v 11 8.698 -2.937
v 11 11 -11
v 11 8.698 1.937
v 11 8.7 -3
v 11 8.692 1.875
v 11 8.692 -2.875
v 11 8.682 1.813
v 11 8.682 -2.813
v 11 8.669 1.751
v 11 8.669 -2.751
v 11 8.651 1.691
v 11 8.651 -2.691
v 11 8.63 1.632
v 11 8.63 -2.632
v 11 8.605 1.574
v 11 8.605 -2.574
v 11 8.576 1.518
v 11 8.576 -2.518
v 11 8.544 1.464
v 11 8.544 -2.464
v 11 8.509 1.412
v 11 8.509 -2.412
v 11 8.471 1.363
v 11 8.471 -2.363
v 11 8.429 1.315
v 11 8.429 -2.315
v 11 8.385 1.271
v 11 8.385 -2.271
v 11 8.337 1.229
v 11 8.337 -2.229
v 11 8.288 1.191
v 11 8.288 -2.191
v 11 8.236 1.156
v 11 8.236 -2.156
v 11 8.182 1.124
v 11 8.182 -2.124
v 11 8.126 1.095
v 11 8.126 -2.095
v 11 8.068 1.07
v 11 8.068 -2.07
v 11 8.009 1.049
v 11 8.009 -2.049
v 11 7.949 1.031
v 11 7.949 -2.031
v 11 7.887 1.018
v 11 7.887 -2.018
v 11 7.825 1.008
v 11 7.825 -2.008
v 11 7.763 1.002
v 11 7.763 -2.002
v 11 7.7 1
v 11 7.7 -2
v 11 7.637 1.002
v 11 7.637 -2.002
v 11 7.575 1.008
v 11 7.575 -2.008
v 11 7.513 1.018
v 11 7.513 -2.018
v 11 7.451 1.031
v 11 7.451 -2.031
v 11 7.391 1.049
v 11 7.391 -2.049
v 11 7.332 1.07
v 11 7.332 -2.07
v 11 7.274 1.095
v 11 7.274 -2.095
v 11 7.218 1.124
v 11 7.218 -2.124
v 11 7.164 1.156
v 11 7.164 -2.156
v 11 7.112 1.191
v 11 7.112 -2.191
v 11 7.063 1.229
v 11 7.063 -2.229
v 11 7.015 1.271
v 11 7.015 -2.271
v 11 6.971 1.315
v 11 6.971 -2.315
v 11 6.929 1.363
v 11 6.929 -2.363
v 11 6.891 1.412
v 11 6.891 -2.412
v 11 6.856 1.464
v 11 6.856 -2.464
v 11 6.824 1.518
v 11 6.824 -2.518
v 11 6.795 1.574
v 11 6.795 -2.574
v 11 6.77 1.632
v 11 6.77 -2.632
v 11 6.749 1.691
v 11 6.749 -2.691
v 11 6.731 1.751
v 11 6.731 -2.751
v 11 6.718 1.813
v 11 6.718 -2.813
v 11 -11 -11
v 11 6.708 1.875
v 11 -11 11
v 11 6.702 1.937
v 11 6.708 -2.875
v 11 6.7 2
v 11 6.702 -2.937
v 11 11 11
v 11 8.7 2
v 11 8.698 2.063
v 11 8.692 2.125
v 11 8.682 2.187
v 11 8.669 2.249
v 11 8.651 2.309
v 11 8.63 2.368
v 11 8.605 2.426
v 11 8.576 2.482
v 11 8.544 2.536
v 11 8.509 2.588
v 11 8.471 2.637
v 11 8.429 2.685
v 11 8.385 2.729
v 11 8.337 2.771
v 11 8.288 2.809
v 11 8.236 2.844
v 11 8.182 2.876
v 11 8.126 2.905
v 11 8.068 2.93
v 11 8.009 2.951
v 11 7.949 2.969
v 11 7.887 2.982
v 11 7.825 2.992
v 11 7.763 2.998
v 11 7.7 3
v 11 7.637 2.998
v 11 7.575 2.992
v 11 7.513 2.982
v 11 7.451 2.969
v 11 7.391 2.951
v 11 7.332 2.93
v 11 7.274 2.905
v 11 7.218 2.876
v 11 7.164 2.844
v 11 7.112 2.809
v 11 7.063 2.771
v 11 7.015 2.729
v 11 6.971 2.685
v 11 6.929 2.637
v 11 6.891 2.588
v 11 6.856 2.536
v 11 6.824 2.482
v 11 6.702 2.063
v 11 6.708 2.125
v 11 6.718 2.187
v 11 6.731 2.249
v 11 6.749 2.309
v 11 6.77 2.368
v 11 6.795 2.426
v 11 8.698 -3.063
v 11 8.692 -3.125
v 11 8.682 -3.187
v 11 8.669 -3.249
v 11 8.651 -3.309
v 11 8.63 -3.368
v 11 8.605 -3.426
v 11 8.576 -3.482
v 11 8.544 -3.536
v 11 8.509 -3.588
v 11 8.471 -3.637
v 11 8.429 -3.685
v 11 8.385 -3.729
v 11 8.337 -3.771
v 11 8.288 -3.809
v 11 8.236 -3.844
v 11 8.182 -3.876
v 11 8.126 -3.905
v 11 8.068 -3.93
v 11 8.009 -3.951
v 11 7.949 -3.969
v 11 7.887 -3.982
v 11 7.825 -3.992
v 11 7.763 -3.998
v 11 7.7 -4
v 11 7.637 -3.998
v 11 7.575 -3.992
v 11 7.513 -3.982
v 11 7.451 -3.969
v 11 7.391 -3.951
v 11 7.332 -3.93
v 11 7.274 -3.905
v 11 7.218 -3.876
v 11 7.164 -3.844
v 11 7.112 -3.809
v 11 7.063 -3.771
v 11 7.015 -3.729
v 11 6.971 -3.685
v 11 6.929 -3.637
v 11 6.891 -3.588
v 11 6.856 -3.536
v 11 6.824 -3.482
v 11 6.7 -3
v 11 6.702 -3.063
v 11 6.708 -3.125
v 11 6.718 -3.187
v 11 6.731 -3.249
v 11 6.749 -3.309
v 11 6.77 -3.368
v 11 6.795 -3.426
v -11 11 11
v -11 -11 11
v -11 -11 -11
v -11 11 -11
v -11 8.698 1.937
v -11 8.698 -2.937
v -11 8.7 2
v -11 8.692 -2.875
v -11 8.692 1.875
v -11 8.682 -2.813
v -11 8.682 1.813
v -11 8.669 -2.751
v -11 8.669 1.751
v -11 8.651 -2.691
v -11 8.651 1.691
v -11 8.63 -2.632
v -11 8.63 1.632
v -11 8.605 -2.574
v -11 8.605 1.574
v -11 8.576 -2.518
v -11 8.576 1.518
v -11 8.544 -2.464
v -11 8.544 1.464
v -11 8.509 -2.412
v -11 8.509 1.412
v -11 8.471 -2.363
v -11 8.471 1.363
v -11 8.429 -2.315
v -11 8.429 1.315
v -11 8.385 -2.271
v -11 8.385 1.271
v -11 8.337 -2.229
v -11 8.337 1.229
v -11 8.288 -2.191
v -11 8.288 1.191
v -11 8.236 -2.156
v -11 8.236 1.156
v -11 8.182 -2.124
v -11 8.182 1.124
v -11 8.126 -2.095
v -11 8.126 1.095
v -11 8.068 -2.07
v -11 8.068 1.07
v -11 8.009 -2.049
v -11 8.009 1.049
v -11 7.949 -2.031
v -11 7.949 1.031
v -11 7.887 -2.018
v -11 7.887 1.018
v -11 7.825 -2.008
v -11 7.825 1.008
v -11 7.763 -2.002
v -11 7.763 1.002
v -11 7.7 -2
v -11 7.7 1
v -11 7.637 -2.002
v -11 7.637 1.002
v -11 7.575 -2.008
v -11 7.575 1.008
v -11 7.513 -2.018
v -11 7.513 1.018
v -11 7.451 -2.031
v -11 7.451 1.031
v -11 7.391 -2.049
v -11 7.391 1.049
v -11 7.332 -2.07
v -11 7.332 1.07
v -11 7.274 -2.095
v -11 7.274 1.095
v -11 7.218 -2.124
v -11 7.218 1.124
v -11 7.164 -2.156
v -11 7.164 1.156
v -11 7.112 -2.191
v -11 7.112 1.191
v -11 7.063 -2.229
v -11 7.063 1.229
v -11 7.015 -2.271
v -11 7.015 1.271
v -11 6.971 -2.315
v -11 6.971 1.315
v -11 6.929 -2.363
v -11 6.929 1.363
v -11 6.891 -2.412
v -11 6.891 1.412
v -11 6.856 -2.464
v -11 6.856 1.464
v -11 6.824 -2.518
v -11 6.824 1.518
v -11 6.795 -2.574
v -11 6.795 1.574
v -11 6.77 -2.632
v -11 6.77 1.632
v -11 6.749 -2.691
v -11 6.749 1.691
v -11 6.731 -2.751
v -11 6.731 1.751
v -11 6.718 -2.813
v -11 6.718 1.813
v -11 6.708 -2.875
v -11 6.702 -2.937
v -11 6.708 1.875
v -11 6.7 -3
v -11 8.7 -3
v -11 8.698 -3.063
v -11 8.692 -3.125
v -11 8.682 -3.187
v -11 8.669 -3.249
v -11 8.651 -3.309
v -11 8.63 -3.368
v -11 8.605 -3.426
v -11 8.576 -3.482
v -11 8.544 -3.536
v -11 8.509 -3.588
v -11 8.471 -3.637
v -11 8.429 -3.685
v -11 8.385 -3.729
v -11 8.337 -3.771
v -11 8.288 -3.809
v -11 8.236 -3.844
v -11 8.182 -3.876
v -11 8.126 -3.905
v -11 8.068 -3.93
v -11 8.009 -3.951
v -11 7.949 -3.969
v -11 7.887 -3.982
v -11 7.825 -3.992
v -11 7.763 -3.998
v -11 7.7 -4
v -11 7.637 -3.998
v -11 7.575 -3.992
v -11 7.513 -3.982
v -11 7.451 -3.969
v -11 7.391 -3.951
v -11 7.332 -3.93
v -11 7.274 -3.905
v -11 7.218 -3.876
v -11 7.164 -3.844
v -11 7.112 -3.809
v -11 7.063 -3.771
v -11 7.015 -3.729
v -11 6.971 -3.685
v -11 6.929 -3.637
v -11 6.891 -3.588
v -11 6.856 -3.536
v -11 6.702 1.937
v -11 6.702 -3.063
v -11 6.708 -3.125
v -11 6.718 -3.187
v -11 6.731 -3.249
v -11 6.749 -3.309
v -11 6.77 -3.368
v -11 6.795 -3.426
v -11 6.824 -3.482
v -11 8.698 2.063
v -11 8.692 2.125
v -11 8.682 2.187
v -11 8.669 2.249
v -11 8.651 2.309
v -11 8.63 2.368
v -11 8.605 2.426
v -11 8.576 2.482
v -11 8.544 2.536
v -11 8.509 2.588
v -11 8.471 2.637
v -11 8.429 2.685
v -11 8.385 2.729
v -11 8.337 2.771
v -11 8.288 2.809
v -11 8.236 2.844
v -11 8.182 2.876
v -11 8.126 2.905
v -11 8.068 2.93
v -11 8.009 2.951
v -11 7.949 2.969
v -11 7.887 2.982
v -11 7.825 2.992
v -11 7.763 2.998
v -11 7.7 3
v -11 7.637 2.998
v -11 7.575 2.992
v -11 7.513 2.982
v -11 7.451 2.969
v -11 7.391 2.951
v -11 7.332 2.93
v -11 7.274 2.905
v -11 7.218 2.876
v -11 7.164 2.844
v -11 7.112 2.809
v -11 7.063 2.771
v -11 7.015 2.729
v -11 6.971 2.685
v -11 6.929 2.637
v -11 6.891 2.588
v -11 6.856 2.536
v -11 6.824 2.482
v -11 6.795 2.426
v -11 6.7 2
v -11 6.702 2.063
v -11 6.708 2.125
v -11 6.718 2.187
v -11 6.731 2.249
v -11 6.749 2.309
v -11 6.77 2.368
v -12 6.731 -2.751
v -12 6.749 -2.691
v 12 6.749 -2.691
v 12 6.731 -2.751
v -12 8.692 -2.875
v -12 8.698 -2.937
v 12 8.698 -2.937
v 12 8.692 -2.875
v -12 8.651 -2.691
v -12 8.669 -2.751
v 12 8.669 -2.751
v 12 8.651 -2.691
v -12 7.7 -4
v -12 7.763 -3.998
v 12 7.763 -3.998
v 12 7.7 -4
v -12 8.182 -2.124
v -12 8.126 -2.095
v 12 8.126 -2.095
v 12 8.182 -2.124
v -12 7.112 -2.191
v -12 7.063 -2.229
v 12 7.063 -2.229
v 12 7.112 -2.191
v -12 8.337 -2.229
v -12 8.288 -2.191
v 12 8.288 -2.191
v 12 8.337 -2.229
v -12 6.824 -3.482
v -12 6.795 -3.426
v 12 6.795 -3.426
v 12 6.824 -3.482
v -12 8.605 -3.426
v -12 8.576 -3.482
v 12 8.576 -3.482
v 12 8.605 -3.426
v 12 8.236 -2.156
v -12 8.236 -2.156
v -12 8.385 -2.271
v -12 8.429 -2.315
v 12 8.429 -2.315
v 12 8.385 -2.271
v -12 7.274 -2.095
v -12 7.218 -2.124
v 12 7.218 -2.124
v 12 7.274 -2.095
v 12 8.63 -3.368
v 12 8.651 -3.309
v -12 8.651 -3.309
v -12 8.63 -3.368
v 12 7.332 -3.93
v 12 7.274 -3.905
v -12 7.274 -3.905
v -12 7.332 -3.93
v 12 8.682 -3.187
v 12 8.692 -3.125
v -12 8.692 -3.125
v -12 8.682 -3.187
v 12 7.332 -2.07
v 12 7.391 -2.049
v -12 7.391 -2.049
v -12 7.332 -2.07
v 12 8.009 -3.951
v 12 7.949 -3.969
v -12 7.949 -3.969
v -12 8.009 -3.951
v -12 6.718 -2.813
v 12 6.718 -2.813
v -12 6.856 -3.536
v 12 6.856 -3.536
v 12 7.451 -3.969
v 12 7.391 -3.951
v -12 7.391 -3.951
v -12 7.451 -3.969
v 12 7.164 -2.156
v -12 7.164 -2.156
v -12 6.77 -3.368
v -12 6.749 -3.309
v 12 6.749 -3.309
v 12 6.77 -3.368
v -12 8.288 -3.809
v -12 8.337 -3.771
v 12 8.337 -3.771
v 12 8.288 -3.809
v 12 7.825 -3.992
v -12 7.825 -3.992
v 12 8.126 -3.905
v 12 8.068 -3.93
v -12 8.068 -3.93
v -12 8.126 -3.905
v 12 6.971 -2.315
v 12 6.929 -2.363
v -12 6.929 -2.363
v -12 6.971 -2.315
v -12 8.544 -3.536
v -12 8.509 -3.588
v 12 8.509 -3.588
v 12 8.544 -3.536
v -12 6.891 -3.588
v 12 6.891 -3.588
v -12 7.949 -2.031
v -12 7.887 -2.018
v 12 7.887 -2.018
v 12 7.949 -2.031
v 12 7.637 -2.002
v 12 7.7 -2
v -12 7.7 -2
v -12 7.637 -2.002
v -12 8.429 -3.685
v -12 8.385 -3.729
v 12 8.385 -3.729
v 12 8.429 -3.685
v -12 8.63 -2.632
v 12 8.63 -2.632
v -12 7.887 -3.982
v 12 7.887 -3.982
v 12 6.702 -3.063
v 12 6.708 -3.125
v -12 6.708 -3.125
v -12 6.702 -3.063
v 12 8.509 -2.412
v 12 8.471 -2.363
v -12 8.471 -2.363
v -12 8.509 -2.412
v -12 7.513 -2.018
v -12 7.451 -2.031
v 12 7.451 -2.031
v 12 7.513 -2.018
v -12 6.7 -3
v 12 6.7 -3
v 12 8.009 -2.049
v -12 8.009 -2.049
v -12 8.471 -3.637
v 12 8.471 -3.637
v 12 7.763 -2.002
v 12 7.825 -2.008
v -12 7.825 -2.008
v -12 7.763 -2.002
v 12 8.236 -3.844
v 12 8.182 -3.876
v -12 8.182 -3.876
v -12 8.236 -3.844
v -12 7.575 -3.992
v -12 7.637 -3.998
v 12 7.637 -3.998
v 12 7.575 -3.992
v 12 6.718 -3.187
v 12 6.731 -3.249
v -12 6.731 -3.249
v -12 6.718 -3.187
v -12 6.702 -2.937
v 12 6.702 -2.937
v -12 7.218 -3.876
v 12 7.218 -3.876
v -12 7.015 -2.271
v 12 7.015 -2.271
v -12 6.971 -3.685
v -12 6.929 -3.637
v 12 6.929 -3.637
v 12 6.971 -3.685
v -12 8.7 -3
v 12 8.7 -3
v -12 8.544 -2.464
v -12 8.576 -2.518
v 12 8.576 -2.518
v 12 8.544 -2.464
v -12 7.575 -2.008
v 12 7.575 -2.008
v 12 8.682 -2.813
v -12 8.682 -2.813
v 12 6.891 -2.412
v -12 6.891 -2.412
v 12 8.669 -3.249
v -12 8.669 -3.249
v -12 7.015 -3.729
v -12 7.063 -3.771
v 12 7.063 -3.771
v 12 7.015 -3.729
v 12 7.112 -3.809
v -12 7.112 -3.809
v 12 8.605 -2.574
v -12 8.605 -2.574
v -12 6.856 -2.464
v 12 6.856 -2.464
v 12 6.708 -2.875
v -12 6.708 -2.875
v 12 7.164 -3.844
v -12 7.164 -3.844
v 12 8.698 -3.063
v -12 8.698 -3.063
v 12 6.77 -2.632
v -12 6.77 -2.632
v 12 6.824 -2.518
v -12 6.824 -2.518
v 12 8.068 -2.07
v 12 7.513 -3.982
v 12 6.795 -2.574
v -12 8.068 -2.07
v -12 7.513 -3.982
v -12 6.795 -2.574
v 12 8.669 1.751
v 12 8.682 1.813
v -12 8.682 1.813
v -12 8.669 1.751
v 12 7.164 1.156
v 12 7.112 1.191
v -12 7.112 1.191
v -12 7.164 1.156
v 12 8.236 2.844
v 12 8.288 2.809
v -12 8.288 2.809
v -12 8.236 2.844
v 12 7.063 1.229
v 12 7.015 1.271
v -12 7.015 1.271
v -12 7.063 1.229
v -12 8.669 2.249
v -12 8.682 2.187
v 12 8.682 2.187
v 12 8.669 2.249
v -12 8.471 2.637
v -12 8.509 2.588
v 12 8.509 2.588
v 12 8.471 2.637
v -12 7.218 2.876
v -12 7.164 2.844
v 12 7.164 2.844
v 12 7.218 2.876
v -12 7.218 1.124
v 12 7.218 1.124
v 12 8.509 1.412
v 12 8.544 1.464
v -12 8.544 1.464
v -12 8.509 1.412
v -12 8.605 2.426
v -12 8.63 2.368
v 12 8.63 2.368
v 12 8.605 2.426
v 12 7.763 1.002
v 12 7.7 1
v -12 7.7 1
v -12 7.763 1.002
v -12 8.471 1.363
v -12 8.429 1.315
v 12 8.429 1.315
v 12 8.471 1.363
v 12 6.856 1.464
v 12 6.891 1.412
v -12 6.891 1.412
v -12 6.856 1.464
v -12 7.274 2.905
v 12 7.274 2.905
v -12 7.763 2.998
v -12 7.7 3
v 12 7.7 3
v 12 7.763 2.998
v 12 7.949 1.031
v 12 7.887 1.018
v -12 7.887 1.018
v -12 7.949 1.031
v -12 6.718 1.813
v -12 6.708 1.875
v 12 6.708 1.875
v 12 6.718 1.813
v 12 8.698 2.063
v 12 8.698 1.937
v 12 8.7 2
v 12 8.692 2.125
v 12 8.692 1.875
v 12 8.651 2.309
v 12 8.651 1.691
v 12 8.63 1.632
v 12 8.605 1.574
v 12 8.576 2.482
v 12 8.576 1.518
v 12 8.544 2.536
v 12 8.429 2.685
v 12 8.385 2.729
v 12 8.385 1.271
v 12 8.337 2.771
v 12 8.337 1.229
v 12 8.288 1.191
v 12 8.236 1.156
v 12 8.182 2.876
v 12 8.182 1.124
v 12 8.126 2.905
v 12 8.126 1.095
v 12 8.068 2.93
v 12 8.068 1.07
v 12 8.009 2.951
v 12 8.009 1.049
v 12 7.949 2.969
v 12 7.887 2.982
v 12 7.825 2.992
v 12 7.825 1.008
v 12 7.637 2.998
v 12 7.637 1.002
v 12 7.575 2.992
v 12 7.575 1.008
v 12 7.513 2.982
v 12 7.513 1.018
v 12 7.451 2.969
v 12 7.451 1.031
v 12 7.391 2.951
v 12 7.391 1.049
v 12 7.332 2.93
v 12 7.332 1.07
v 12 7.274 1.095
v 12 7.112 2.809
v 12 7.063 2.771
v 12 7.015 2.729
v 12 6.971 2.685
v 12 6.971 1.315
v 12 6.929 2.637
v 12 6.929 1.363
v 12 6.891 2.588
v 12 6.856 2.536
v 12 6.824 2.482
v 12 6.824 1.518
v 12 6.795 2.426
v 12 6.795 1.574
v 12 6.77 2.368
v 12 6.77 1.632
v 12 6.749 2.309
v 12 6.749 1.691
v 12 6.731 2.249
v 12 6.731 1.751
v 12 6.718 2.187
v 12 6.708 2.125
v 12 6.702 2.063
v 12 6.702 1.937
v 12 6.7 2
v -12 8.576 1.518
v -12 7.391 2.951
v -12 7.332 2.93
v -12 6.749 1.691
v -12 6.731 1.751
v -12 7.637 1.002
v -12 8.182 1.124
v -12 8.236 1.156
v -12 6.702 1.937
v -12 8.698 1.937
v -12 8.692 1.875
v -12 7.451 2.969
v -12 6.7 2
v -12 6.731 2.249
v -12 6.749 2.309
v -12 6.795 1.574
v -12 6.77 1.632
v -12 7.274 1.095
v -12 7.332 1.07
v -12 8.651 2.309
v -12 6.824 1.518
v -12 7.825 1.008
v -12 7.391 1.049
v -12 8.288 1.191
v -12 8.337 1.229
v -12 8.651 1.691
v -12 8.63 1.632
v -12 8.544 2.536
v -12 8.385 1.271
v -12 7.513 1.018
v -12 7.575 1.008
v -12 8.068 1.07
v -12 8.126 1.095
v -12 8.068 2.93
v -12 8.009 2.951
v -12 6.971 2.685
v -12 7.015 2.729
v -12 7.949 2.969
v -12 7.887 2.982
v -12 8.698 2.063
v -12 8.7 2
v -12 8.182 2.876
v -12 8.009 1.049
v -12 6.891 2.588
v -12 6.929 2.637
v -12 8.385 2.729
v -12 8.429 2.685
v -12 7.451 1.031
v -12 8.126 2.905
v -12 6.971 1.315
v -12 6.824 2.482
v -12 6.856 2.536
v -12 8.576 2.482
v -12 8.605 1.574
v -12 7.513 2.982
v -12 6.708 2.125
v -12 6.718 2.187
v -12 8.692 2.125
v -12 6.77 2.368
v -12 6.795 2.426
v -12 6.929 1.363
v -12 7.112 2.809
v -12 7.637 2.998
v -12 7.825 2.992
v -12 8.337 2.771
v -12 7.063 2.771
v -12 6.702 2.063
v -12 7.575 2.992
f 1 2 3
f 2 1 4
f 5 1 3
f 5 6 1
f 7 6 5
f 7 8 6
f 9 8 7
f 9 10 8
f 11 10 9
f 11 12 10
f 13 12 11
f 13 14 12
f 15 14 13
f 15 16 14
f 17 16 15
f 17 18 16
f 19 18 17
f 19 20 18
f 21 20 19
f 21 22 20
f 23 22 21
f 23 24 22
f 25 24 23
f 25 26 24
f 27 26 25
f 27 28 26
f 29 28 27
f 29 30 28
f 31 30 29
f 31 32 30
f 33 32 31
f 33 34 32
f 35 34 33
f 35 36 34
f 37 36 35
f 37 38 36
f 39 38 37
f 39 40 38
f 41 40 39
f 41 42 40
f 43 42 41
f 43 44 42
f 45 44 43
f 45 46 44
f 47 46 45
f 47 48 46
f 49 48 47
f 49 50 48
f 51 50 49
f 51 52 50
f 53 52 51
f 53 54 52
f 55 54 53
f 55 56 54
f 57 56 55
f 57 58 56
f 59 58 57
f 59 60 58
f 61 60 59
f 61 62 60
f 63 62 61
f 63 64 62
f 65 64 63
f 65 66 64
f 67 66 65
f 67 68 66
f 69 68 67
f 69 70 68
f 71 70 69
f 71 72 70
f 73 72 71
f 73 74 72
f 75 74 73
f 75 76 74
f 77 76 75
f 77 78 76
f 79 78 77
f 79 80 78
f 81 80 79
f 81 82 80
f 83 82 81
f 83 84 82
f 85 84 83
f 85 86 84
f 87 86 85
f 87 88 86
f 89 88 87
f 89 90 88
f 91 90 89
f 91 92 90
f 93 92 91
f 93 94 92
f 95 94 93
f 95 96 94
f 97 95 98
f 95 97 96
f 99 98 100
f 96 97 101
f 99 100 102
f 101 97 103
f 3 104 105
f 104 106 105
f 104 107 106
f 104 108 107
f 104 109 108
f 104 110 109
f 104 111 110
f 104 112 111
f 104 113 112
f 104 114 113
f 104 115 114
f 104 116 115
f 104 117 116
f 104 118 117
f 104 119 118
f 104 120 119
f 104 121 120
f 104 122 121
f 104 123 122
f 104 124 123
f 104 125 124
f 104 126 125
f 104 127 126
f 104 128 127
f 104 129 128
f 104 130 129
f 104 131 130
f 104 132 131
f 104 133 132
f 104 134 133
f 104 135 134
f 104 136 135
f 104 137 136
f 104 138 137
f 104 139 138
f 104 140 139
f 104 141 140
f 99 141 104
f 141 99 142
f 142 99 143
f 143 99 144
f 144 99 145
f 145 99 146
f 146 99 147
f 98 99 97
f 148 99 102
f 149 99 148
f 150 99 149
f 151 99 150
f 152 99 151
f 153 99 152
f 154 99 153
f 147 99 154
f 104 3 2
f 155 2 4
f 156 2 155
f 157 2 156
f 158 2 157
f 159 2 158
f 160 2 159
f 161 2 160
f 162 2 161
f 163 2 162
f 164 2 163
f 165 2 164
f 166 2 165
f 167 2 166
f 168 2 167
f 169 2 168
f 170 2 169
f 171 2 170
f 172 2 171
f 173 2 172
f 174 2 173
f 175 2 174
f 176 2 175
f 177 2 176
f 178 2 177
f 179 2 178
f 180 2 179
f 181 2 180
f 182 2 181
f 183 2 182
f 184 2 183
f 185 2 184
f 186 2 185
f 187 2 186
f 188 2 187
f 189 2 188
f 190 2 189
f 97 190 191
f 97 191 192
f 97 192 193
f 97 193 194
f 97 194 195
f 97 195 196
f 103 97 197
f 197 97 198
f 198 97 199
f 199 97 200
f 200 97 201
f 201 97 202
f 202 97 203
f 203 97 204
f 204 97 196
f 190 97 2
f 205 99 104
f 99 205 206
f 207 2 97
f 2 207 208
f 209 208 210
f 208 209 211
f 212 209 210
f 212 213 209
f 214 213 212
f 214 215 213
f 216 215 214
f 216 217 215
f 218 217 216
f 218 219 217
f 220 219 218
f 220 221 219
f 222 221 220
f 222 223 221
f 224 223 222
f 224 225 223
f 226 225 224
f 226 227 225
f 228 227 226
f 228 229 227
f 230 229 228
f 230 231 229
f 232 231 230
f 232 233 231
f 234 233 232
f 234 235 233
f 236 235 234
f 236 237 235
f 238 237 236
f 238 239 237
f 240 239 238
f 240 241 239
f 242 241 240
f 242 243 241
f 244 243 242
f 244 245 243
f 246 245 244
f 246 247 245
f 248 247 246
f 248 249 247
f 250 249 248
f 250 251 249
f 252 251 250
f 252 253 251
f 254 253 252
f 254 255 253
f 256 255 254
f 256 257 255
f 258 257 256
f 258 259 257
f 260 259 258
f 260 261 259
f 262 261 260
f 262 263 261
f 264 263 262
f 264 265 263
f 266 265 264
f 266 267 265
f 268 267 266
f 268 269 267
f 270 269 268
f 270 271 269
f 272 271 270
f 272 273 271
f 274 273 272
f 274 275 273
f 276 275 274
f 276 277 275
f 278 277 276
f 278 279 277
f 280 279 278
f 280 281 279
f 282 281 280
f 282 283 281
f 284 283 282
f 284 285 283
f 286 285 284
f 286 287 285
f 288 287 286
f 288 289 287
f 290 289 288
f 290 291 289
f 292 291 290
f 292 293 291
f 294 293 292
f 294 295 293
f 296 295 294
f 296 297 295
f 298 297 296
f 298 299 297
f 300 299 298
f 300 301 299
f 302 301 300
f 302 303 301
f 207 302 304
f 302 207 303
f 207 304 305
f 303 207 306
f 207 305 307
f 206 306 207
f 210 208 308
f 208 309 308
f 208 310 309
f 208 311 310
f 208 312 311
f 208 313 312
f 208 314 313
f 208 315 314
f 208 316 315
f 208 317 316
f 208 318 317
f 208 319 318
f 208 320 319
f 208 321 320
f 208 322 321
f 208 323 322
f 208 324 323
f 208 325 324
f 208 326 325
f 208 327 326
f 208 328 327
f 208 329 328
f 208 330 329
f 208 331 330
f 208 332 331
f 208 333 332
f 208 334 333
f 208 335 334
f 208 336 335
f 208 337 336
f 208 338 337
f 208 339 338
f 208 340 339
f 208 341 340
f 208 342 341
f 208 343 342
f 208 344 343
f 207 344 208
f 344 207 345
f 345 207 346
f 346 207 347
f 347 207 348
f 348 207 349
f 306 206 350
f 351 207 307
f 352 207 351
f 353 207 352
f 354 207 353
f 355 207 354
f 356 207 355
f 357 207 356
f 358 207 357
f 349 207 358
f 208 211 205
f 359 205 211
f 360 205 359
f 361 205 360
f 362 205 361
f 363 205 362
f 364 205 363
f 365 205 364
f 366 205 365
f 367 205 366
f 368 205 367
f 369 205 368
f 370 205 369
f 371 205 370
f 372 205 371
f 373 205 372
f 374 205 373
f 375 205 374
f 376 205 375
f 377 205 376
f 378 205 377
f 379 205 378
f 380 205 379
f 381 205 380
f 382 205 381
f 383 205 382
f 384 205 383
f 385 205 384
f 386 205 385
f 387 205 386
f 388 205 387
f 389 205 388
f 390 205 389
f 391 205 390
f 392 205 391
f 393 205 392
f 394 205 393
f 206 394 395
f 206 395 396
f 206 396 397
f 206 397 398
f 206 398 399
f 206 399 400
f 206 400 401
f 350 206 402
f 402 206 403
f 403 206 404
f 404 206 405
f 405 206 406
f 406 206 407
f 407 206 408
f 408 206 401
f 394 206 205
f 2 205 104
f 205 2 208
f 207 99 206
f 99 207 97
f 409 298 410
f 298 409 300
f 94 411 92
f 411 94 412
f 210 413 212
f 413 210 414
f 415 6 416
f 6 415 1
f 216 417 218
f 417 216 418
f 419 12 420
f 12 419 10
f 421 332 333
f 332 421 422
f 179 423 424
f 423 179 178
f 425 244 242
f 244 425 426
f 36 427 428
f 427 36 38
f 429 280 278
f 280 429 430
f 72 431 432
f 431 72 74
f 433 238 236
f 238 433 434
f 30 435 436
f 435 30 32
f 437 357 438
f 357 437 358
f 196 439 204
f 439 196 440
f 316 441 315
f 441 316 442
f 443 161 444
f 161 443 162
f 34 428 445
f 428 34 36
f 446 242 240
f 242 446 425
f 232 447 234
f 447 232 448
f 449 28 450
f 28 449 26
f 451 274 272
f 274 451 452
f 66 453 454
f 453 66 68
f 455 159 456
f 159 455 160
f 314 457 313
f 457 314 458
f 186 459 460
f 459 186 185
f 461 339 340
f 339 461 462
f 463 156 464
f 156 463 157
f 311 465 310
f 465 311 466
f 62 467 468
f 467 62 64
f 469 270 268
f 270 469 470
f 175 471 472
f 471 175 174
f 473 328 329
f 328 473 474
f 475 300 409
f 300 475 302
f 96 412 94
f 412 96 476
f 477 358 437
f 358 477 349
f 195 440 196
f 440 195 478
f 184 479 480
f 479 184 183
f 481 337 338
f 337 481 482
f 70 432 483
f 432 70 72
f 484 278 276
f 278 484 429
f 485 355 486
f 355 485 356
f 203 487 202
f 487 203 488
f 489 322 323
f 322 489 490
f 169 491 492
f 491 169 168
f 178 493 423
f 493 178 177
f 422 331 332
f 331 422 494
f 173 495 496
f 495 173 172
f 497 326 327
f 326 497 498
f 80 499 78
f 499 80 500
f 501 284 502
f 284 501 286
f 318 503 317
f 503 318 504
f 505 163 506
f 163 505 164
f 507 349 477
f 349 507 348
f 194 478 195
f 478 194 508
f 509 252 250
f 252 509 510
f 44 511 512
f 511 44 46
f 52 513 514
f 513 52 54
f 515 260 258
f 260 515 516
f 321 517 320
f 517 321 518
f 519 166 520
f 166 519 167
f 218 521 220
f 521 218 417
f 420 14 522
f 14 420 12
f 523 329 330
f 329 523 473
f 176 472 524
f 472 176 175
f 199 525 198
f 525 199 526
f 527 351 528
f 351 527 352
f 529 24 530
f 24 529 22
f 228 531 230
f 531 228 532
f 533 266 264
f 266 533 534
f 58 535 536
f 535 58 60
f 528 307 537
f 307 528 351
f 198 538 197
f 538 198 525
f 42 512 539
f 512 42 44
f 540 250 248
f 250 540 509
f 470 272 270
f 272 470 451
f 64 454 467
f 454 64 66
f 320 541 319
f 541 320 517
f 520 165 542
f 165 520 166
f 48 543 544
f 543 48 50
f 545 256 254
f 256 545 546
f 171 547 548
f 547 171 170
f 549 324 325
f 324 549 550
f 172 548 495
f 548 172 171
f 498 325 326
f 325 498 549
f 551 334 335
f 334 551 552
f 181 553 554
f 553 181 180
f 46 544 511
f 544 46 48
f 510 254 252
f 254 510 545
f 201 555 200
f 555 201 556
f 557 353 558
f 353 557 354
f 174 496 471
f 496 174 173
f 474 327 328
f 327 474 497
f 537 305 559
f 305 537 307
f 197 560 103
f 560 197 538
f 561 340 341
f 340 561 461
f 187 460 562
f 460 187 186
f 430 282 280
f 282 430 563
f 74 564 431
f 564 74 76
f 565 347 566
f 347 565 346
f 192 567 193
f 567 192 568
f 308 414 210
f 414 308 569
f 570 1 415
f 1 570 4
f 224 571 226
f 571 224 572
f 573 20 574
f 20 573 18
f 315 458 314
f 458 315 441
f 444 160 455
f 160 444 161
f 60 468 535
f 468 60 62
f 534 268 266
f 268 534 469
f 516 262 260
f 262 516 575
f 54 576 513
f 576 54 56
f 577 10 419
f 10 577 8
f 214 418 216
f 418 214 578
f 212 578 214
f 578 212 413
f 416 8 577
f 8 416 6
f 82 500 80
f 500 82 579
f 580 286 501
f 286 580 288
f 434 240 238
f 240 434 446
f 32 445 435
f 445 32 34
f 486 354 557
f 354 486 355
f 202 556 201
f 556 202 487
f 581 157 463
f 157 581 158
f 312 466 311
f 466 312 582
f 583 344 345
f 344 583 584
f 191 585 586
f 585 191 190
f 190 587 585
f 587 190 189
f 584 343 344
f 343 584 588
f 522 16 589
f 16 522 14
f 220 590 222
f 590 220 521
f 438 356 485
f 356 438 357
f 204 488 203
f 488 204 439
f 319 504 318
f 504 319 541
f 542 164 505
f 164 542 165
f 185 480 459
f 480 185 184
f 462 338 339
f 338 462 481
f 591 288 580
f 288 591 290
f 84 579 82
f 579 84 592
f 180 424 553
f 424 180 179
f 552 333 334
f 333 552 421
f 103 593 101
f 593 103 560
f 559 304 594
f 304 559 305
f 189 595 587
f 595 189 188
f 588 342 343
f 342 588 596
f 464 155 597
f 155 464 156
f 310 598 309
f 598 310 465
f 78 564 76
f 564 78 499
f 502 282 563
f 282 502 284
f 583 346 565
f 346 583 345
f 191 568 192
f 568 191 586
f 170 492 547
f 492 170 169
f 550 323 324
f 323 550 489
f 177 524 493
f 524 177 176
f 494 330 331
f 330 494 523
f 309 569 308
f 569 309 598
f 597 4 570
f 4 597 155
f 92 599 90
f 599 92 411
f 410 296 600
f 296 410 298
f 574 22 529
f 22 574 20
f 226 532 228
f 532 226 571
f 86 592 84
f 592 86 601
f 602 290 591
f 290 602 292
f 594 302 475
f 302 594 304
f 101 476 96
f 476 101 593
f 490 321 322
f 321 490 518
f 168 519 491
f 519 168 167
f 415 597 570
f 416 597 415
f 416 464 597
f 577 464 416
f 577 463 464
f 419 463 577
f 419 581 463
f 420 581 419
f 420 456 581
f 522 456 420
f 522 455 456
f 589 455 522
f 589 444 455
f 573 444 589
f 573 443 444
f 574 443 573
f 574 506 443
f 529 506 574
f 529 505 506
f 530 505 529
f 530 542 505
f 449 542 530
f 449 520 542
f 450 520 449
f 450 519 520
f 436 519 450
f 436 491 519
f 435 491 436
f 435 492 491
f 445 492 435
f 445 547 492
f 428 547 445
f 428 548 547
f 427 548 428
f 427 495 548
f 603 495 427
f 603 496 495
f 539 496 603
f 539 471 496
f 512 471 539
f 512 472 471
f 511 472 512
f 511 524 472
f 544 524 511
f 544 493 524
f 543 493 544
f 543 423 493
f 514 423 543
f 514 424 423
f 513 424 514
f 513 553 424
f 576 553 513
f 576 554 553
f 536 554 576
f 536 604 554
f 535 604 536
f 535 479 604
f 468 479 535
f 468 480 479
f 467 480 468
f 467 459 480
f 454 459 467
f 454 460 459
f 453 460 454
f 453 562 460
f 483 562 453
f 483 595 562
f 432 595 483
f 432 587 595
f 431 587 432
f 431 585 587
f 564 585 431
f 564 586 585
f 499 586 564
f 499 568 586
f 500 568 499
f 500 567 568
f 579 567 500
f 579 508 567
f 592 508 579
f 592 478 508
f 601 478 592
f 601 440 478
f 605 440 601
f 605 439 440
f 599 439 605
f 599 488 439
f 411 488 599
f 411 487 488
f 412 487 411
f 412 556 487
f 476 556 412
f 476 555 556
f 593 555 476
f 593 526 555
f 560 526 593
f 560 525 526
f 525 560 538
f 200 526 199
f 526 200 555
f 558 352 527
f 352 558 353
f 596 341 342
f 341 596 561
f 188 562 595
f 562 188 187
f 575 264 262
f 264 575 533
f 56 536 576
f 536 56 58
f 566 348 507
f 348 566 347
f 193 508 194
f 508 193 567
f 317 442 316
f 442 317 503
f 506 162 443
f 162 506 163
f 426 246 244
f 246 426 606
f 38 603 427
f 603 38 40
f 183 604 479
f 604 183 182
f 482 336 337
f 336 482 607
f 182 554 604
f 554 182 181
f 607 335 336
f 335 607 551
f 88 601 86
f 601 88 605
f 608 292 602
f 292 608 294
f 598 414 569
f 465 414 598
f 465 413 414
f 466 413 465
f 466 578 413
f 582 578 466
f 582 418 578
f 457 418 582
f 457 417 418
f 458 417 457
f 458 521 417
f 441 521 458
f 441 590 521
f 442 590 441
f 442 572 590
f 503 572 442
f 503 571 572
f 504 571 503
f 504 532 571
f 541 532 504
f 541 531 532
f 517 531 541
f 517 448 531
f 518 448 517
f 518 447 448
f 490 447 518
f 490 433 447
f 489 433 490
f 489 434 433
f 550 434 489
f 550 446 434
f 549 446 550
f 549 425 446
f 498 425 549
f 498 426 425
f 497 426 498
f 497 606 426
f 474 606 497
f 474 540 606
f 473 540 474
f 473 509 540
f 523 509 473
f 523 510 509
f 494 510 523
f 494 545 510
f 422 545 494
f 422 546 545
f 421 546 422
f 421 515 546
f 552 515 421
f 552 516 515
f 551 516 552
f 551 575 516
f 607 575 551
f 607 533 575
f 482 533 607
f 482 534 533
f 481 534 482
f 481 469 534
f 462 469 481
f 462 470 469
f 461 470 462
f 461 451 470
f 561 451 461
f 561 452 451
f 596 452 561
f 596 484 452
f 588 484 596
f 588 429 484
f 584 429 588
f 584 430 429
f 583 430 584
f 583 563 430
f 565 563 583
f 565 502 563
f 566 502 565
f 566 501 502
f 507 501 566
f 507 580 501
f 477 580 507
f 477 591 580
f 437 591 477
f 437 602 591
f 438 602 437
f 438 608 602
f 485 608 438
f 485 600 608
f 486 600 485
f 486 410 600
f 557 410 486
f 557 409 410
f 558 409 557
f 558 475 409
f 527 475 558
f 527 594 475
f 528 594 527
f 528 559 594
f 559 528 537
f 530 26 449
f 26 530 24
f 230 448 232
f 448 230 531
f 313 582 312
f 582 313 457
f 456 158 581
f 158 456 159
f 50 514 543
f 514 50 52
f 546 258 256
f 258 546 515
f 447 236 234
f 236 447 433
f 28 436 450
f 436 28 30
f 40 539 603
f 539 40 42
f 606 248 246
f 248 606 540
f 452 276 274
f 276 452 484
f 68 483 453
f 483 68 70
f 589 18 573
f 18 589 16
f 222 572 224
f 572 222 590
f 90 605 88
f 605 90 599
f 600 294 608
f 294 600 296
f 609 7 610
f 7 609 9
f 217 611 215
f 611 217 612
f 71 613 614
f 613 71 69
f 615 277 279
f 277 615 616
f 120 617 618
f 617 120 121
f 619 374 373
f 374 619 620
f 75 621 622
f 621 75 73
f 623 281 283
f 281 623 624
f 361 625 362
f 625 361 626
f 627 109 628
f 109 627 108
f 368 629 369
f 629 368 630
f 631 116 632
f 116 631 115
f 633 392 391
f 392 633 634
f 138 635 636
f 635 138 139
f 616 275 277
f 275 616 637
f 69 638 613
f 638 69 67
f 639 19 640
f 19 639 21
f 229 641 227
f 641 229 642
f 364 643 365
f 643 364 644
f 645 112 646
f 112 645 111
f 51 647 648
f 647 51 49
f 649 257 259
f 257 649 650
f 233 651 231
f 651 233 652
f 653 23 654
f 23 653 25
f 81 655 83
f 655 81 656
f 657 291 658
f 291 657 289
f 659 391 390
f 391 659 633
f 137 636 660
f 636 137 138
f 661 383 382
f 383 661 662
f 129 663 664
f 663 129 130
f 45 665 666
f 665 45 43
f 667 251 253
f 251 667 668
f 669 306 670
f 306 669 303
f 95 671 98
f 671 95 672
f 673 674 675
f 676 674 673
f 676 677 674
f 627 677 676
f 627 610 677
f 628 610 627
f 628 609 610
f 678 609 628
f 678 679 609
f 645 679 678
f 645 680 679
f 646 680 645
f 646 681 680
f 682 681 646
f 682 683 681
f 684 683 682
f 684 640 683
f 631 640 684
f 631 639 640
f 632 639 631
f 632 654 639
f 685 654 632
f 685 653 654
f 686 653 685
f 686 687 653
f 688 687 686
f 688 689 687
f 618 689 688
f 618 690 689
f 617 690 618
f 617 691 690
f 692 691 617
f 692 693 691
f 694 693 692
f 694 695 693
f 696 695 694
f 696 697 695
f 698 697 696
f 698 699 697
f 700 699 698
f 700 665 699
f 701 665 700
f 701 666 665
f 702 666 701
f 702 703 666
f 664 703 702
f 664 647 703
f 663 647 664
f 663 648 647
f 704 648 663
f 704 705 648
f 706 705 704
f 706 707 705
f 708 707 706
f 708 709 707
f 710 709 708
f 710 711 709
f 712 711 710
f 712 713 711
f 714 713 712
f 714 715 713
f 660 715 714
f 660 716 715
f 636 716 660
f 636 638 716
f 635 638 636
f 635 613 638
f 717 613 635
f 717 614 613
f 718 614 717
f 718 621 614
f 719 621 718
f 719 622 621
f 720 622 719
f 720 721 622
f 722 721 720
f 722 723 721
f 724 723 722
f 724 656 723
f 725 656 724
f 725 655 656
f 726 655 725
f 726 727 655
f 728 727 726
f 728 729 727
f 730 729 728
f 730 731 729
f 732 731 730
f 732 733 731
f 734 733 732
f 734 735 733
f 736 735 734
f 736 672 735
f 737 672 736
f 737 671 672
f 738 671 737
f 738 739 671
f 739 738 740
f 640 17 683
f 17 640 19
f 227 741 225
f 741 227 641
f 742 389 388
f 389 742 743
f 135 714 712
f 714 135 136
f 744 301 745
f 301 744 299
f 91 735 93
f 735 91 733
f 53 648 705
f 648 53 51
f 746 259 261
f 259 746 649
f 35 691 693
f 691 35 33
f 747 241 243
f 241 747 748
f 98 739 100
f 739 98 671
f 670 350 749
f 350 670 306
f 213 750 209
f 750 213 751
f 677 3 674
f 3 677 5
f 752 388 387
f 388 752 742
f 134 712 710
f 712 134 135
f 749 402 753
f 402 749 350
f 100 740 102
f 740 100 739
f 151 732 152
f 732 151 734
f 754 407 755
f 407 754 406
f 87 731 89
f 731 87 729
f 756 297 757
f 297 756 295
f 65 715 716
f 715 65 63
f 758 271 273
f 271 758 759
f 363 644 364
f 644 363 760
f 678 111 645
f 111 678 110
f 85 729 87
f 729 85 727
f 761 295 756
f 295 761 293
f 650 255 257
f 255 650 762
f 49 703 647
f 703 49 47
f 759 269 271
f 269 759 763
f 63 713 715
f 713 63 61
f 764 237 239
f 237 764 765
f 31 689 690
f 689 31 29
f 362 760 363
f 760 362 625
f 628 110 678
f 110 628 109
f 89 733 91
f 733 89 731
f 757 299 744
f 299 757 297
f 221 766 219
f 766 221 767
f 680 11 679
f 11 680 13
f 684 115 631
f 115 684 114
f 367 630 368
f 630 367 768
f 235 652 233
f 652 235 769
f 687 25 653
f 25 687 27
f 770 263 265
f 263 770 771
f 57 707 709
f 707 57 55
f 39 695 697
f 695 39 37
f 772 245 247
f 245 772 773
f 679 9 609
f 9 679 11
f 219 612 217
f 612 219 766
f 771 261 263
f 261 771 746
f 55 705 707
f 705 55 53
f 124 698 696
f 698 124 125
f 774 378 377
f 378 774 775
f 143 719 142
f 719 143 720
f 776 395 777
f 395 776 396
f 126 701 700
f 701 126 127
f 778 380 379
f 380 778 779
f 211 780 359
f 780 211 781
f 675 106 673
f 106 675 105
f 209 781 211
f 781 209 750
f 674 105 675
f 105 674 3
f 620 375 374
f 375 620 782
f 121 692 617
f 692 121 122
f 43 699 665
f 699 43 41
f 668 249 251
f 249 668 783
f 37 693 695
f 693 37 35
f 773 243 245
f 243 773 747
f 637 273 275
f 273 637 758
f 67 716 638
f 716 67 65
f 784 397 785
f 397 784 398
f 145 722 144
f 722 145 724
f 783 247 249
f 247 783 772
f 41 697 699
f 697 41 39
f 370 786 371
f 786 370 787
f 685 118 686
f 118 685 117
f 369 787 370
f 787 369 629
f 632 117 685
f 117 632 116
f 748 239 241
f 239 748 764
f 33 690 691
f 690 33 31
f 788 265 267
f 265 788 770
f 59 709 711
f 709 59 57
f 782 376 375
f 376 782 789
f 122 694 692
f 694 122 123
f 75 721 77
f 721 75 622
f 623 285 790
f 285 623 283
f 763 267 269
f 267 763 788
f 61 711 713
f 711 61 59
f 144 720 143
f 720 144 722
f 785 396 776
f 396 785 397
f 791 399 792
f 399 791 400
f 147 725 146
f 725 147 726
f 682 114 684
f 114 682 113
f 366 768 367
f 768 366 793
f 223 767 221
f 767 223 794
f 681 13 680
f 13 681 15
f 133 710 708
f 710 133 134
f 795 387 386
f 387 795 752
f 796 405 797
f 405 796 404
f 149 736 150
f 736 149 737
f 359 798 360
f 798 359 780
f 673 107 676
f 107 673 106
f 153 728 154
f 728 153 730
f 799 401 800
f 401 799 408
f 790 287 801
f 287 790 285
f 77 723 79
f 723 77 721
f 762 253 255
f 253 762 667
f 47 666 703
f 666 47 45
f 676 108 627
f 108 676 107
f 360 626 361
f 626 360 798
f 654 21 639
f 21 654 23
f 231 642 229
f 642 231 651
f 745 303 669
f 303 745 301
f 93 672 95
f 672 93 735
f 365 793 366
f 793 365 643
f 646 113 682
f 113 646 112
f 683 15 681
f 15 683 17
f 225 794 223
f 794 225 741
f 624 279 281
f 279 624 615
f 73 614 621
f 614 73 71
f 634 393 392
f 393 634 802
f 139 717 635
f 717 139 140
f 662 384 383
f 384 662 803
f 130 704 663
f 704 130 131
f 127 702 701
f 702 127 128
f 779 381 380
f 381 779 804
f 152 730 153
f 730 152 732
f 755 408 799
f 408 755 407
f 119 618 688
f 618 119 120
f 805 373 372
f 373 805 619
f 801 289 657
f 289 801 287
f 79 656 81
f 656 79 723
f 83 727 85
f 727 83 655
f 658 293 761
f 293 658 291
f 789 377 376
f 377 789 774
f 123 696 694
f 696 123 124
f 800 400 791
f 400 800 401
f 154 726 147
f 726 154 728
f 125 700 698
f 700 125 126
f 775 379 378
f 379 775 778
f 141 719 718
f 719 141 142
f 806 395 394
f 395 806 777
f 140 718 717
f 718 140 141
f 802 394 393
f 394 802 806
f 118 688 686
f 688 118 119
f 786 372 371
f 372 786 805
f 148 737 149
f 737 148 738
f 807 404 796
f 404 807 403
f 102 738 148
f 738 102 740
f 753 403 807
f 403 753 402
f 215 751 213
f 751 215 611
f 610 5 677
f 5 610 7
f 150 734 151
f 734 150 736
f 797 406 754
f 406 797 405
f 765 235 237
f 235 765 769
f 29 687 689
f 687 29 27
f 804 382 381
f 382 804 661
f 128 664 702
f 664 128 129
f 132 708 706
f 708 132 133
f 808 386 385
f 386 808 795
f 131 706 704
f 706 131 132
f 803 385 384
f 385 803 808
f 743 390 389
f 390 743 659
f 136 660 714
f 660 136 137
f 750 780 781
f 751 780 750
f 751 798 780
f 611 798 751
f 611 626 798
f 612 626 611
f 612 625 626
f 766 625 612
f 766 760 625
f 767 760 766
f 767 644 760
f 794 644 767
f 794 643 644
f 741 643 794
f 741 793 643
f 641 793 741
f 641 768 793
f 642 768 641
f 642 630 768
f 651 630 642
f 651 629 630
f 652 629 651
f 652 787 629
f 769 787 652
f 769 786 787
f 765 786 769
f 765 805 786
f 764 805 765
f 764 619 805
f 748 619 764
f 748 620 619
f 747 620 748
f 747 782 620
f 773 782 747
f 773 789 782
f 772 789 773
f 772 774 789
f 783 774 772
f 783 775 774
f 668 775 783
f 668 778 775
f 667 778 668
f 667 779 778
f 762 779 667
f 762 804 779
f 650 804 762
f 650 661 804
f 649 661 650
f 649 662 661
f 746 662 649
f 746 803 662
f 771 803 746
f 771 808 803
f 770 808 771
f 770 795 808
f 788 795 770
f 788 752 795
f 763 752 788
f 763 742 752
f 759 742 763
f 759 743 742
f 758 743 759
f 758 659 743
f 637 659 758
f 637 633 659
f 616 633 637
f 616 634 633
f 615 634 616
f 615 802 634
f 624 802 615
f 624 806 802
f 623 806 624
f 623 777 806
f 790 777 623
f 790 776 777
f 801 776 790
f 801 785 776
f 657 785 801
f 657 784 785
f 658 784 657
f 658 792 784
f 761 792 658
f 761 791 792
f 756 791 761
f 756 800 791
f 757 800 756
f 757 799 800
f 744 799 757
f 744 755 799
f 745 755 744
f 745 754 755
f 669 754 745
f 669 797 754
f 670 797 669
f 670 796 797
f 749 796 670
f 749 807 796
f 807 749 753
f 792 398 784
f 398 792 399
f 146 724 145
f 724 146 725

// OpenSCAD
module camera_mini() {

    cube([22,22,22], true);

    translate([0,7.7,-3])rotate([0,90,0]) cylinder(d1=2, d2=2, center=true, h=24,$fn=100);

    translate([0,7.7,2])rotate([0,90,0]) cylinder(d1=2, d2=2, center=true, h=24,$fn=100);
}

camera_mini();
